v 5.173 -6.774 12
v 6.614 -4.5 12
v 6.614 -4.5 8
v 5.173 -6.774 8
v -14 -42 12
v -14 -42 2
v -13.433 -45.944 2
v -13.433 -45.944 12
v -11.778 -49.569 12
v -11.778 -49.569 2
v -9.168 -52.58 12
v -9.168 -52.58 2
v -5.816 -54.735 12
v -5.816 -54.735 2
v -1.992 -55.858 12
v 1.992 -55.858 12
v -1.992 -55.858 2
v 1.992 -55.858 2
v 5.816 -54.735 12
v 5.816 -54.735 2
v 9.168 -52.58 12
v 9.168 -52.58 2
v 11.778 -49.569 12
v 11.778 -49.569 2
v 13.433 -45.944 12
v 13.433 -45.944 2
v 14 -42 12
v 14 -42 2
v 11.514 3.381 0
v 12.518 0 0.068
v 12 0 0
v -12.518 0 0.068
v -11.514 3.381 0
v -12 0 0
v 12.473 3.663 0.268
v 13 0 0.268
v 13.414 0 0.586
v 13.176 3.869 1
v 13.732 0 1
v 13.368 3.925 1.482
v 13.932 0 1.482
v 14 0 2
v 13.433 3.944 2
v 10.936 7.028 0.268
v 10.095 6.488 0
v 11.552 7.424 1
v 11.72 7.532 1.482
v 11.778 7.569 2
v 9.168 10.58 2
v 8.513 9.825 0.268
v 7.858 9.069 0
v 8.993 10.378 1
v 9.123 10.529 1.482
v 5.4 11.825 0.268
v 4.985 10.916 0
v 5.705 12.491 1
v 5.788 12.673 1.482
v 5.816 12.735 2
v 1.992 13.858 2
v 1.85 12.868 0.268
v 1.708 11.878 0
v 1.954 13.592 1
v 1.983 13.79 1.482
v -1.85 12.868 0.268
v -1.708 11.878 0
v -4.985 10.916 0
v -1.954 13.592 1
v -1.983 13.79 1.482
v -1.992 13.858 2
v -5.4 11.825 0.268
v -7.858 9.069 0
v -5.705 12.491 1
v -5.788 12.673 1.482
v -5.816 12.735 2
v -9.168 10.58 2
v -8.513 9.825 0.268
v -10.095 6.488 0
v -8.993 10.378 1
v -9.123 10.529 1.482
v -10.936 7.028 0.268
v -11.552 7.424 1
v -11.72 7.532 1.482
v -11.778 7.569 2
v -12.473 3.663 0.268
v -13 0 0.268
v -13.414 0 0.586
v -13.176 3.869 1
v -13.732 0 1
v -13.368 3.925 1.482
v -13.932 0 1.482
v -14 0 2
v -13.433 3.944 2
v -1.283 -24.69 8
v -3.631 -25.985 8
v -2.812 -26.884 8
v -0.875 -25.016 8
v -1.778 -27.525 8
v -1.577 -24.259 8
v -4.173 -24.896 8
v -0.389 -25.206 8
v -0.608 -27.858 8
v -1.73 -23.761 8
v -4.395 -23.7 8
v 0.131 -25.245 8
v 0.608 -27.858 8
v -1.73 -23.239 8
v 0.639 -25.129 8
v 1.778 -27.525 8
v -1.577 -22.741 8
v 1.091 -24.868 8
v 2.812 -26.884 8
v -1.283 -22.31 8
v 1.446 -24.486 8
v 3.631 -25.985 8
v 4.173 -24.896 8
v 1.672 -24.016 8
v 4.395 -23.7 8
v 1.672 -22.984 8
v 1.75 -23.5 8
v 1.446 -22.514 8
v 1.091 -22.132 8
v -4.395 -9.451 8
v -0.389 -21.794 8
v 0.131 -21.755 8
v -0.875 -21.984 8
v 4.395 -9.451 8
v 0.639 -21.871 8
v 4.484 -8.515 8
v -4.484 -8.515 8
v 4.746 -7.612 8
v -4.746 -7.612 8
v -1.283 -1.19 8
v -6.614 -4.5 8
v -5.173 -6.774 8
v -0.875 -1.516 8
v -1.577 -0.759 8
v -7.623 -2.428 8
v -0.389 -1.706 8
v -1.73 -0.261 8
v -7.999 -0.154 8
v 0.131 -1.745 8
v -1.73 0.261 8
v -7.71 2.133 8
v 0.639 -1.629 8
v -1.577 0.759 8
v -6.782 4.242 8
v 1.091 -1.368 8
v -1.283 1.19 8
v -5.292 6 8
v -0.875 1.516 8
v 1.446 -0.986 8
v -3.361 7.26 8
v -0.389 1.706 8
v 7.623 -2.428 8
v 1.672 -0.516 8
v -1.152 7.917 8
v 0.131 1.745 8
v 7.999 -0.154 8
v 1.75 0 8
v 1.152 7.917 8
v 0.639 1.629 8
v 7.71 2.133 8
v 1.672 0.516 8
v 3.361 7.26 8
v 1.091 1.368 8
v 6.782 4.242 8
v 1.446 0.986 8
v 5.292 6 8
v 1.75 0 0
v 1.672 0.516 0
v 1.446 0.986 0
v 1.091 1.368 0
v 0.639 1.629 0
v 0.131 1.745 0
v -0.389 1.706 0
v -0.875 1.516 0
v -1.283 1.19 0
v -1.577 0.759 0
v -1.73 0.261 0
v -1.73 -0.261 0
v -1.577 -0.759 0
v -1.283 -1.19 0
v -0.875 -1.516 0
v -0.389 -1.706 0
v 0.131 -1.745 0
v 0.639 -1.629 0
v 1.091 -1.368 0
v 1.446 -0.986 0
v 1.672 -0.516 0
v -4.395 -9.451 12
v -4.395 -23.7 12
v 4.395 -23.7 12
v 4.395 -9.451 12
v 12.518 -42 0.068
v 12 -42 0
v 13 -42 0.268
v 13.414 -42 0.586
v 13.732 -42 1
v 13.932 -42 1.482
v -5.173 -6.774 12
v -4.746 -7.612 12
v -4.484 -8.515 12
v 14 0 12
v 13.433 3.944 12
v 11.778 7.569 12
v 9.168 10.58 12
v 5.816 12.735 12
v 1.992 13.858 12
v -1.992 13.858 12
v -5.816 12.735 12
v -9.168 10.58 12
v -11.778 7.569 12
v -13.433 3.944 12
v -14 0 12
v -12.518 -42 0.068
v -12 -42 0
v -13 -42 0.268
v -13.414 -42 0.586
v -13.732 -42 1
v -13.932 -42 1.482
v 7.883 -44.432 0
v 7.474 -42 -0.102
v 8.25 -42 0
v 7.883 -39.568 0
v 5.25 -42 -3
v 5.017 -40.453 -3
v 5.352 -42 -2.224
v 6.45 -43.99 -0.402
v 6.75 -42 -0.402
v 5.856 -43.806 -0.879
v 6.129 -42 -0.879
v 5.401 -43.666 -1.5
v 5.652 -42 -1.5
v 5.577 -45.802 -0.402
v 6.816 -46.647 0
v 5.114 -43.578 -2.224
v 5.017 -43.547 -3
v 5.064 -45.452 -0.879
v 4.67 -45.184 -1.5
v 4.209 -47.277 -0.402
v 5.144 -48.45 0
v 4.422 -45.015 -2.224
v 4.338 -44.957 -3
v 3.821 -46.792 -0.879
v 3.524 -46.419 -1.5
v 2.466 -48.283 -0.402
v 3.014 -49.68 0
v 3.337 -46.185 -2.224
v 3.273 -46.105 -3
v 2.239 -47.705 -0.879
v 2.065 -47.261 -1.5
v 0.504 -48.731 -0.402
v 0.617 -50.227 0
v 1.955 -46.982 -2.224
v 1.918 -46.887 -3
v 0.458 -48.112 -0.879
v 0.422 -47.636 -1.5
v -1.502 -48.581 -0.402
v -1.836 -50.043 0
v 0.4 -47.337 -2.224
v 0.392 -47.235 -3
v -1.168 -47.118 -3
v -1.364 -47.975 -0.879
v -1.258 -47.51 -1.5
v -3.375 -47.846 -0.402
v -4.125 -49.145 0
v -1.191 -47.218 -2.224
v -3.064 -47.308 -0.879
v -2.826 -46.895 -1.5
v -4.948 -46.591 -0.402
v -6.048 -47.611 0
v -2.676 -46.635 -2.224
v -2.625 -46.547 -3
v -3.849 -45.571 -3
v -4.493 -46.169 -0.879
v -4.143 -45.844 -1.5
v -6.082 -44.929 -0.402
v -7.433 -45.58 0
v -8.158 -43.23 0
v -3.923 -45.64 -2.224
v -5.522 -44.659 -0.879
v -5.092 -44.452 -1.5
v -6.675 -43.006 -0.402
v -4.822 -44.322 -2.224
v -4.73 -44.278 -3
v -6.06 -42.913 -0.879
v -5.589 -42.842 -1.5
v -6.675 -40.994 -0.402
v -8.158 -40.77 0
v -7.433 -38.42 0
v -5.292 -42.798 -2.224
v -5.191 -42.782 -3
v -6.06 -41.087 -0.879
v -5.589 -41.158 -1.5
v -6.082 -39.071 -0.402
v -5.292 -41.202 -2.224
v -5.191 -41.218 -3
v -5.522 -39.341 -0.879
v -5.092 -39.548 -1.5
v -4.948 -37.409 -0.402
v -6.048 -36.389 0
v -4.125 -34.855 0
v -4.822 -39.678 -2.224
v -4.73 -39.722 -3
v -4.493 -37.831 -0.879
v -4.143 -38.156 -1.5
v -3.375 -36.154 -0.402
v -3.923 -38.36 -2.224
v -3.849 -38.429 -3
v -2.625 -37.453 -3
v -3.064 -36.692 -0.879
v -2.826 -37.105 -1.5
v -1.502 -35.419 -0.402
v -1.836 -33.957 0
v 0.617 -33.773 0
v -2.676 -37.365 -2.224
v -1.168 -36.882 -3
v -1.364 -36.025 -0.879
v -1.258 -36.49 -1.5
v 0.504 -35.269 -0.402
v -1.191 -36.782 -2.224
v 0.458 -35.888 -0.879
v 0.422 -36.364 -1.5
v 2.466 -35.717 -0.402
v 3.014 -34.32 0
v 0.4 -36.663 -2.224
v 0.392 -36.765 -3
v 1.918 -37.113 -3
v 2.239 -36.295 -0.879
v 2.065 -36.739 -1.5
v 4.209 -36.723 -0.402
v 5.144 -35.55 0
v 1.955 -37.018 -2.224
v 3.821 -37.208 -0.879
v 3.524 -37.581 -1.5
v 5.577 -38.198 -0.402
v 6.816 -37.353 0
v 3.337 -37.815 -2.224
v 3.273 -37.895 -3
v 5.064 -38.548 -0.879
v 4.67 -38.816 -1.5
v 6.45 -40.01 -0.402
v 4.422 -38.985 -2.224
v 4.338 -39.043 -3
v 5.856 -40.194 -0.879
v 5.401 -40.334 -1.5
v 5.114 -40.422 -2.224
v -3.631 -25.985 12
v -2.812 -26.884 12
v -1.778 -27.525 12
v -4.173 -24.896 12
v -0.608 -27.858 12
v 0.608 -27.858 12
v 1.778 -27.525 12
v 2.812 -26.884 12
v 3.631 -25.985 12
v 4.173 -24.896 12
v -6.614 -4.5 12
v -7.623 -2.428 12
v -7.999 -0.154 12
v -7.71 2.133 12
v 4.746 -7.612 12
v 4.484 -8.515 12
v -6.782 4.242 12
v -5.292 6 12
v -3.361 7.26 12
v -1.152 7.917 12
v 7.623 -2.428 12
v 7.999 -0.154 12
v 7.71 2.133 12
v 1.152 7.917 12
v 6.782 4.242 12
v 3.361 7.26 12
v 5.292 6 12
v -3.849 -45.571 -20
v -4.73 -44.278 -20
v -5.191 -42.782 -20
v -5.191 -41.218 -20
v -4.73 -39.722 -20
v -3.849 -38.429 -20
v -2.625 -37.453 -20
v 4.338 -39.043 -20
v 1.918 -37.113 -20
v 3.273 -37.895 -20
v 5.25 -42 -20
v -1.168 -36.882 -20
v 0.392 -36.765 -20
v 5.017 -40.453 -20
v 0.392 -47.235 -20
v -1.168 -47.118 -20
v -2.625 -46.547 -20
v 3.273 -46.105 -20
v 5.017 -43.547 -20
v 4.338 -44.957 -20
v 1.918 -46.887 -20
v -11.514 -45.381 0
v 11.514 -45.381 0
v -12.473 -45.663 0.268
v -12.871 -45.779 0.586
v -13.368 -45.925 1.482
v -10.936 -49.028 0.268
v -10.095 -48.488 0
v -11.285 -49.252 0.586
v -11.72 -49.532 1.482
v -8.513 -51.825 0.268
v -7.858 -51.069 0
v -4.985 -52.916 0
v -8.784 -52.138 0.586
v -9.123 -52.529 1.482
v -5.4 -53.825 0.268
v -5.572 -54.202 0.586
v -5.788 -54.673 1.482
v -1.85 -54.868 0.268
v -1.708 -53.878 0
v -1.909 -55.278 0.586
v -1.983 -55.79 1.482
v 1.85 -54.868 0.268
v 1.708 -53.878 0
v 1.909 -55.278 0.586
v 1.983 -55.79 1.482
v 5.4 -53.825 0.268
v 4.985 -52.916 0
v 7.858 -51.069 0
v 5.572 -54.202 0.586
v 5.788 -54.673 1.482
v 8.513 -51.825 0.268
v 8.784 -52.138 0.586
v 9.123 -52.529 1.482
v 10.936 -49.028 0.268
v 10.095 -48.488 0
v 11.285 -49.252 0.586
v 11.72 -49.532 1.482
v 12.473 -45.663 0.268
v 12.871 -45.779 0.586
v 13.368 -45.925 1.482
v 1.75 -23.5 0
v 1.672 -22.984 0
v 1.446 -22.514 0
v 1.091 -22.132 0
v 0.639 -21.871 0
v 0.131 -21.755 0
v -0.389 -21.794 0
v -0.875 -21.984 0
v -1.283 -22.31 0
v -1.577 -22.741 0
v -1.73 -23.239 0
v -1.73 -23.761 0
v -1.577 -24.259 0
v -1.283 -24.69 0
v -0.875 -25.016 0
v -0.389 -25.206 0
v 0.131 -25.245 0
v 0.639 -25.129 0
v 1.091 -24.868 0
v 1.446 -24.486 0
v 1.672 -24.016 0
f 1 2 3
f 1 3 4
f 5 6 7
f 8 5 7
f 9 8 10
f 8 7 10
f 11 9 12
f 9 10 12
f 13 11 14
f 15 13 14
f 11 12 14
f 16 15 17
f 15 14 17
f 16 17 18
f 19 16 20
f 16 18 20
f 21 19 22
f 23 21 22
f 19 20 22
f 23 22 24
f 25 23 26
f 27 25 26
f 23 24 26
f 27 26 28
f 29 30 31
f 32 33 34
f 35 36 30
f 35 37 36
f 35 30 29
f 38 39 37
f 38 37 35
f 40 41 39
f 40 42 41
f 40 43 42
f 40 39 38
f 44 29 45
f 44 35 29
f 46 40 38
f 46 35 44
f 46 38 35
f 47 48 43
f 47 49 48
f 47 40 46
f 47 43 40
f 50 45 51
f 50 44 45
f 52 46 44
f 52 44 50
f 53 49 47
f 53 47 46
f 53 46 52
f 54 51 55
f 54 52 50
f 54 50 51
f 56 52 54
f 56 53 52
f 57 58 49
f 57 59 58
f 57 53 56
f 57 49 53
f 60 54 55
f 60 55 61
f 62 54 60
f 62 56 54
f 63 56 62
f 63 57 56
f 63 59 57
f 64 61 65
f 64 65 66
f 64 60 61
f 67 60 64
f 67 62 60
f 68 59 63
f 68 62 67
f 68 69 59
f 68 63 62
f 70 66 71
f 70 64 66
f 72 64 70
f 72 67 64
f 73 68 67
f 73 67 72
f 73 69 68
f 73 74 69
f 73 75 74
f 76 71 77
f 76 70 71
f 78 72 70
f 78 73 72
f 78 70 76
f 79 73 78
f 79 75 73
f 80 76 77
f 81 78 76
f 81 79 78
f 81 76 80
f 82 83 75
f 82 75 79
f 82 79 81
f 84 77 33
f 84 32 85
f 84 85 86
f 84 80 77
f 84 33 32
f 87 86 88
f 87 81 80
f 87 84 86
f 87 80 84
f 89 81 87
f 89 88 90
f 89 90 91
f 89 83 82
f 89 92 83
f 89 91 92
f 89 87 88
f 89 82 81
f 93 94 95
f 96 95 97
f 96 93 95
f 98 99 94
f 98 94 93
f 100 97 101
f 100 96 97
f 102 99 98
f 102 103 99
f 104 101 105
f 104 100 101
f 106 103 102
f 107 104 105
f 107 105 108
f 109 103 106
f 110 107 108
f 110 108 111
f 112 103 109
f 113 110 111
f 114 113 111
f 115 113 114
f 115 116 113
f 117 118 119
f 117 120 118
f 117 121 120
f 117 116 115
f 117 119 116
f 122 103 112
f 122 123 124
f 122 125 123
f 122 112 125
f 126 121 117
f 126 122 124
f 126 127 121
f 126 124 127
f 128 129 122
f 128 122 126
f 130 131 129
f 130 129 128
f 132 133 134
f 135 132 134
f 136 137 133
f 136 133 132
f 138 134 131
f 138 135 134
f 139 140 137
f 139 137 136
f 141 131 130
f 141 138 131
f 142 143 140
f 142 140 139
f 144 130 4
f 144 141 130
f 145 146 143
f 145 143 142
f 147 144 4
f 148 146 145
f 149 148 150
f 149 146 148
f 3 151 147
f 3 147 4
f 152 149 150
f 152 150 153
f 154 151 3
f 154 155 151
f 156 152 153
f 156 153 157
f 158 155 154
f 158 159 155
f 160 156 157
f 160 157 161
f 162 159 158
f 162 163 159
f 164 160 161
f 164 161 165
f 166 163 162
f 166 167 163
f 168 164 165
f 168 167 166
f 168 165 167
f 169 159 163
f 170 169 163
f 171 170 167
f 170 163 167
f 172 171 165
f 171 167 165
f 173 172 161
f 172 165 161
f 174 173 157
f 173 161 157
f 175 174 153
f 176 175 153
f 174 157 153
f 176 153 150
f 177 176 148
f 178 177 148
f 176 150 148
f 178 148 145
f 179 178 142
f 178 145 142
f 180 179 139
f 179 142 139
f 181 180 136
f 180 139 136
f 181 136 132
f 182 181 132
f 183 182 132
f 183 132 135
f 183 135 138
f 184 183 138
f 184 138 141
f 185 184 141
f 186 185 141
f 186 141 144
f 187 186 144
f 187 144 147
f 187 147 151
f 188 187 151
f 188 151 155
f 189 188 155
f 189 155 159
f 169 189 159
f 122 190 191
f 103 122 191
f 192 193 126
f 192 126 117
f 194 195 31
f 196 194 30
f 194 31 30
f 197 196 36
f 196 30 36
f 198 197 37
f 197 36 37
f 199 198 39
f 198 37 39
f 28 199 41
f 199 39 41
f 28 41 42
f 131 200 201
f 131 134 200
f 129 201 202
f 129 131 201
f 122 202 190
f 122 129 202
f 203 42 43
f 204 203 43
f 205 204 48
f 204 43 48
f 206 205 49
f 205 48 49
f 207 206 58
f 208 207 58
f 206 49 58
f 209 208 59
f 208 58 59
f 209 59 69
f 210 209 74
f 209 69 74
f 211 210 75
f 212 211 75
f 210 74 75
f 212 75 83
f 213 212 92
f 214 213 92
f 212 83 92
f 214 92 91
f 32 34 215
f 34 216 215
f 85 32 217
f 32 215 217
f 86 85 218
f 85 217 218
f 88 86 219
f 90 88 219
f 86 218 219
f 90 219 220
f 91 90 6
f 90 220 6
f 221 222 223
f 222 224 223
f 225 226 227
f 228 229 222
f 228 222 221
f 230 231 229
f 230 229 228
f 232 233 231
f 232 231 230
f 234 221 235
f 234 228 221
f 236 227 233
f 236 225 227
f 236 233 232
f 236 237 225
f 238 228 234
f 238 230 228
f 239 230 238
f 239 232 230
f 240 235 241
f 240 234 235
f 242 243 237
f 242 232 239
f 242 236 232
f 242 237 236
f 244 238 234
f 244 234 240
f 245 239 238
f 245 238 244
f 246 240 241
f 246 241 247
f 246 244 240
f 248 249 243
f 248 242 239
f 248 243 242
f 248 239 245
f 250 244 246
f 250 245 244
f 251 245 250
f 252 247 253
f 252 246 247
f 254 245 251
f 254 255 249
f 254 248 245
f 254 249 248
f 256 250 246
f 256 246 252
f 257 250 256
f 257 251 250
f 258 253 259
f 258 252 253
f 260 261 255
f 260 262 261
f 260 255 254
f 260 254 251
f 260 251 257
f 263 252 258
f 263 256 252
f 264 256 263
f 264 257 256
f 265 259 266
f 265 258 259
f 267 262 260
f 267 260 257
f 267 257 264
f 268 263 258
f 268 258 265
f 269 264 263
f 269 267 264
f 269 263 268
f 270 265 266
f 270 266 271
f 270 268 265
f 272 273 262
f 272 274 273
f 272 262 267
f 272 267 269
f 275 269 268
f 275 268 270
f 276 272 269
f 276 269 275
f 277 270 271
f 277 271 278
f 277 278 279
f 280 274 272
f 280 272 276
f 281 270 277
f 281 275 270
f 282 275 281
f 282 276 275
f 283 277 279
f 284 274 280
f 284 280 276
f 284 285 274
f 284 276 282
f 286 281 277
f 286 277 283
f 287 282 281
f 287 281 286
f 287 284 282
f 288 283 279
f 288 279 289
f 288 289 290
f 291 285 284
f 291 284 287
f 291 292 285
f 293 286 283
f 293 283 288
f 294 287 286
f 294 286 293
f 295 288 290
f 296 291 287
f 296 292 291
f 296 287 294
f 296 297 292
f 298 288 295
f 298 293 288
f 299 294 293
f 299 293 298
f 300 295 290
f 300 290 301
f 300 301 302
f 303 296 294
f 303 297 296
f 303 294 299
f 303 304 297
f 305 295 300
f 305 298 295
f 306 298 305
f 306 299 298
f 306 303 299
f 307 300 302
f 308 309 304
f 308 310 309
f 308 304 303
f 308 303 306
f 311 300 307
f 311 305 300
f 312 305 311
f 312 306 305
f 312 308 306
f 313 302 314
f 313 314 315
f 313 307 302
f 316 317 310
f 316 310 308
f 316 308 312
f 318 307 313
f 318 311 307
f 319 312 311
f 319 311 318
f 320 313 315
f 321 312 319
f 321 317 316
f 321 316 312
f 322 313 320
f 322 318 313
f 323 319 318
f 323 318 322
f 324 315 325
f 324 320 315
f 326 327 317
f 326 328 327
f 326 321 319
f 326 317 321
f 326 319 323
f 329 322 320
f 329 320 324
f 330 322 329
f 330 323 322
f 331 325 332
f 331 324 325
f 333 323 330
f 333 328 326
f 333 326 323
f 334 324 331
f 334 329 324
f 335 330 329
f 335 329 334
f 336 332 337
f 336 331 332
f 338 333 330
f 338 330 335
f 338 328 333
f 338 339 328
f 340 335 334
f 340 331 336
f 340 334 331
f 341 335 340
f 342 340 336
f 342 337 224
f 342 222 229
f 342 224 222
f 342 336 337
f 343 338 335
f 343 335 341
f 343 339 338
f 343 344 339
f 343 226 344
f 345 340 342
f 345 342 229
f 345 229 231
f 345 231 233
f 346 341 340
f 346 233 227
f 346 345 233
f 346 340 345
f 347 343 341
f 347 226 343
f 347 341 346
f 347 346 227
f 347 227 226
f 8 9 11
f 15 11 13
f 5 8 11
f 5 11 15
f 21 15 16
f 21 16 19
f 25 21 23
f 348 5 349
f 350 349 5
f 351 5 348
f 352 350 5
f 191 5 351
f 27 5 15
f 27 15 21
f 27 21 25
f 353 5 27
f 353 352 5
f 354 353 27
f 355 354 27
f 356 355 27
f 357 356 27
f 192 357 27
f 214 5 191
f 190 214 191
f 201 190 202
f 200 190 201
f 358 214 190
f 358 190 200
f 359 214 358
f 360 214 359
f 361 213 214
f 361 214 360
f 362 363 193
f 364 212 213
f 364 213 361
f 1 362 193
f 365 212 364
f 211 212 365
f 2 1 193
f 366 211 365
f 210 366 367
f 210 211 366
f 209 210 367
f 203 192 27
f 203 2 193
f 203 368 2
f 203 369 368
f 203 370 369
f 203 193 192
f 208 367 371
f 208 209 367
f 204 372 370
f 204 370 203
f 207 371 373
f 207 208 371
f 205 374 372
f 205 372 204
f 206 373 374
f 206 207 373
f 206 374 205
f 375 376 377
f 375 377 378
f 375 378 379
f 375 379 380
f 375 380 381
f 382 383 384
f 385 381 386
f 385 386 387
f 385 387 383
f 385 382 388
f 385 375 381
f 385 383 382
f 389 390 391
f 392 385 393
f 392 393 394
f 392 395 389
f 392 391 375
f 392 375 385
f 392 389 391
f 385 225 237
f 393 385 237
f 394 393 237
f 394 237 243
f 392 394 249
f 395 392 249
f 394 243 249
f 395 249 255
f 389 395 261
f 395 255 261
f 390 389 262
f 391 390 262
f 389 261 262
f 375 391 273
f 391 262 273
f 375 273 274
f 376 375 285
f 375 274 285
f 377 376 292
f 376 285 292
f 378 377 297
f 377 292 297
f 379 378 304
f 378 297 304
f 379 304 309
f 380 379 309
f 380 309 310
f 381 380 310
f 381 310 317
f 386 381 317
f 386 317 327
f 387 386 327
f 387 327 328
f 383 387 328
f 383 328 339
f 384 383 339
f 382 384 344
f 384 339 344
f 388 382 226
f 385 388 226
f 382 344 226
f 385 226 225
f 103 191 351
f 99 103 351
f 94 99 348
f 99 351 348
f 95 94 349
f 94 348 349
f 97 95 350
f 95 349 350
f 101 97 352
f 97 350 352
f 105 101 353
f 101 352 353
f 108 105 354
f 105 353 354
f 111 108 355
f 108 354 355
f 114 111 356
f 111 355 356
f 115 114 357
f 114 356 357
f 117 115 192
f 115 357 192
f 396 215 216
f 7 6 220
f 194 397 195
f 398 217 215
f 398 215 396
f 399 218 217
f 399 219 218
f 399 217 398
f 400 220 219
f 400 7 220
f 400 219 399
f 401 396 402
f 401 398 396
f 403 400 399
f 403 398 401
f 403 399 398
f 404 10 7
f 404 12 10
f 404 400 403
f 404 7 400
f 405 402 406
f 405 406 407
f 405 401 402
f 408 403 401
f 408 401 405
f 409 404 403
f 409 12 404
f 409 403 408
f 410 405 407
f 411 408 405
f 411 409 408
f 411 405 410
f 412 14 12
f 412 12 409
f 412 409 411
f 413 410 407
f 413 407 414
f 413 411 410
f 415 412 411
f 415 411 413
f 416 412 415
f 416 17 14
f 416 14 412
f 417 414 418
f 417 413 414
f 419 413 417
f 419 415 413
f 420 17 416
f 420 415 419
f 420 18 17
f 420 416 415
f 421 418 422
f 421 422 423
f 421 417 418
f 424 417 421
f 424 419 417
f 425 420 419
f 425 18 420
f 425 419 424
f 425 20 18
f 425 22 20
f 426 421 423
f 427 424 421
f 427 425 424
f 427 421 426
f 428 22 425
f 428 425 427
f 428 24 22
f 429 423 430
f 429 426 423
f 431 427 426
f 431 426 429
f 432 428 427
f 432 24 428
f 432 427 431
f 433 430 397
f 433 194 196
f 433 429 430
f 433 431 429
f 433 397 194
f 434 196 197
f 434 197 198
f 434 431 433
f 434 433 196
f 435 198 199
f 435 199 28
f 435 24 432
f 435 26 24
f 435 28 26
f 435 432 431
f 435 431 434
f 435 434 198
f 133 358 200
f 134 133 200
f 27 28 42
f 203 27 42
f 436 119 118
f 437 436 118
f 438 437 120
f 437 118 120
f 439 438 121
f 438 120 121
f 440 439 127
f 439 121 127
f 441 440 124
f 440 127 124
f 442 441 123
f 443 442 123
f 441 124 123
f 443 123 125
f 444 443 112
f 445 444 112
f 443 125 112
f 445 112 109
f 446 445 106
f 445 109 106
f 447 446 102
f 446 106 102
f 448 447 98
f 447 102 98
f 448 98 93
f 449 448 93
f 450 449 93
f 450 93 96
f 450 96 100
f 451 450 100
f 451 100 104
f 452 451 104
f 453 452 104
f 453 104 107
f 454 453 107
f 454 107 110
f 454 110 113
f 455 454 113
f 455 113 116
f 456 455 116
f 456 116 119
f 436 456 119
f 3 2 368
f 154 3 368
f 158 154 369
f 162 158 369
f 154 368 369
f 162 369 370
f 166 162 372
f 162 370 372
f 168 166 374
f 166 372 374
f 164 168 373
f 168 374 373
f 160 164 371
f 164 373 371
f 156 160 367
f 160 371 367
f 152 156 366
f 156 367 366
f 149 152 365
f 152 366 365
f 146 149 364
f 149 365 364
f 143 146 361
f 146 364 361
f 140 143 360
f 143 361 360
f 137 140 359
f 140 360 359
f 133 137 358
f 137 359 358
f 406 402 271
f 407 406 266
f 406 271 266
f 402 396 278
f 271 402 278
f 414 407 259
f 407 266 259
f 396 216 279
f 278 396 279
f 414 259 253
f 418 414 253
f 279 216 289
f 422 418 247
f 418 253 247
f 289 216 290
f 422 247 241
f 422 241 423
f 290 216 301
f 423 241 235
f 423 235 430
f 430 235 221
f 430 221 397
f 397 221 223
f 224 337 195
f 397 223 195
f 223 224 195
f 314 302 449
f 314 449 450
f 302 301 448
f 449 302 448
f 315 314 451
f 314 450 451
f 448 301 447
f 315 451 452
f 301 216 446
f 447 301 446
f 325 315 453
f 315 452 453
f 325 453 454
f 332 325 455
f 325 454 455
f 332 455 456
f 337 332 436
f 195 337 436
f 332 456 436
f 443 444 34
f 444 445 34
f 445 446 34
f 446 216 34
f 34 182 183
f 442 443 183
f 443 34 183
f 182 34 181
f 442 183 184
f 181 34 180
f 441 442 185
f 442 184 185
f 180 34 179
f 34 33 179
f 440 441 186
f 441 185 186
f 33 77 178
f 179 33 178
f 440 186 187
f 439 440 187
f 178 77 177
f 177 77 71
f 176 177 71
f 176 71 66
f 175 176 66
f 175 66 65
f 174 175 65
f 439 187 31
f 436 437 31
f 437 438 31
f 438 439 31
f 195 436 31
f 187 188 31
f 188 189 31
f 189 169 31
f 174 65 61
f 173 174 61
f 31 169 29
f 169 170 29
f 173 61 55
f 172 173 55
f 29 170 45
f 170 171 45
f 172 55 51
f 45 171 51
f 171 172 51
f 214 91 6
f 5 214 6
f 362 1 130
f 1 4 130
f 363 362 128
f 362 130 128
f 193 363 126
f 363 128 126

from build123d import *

# Parameters (mm, degrees)
PAD_DEPTH       = 12
POCKET_DEPTH    = 4
SKETCH002_R     = 5.25
PAD001_DEPTH    = 20
SKETCH003_R     = 1.75
POCKET001_DEPTH = 28.001
FILLET_R        = 3
FILLET001_R     = 2
FILLET002_R     = 5


with BuildPart() as part:
    # Sketch001 → Pad (new body)
    with BuildSketch(Plane.XY):
        with BuildLine():
            ThreePointArc((14, 0), (0, 14), (-14, 0))
            Line((-14, 0), (-14, -42))
            ThreePointArc((-14, -42), (0, -56), (14, -42))
            Line((14, -42), (14, 0))
        make_face()
    extrude(amount=PAD_DEPTH)

    # Sketch (on Face6 of Pad) → Pocket (cut)
    with BuildSketch(Plane.XY.offset(12)):
        with BuildLine():
            ThreePointArc((6.614378, -4.5), (0, 8), (-6.614378, -4.5))
            Line((-6.614378, -4.5), (-4.395452, -8))
            Line((-4.395452, -8), (-4.395452, -23.7))
            ThreePointArc((-4.395452, -23.7), (0, -27.9), (4.395452, -23.7))
            Line((4.395452, -8), (4.395452, -23.7))
            Line((6.614378, -4.5), (4.395452, -8))
        make_face()
    extrude(amount=-POCKET_DEPTH, mode=Mode.SUBTRACT)

    # Sketch002 (on Face4 of Pocket) → Pad001 (join)
    with BuildSketch(Plane(origin=(0, 0, 0), x_dir=(1, 0, 0), z_dir=(0, 0, -1))):
        with Locations((0, 42)):
            Circle(SKETCH002_R)
    extrude(amount=PAD001_DEPTH)

    # Sketch003 (on Face15 of Pad001) → Pocket001 (cut, through all)
    with BuildSketch(Plane.XY.offset(8)):
        Circle(SKETCH003_R)
        with Locations((0, -23.5)):
            Circle(SKETCH003_R)
    extrude(amount=-POCKET001_DEPTH, mode=Mode.SUBTRACT)

    # Fillet
    fillet_edges = [part.edges().sort_by_distance(p)[0] for p in [
        (-5.25, -42, 0),
    ]]
    fillet(fillet_edges, radius=FILLET_R)

    # Fillet001
    fillet001_edges = [part.edges().sort_by_distance(p)[0] for p in [
        (-14, -21, 0),
        (0, 14, 0),
        (14, -21, 0),
        (0, -56, 0),
    ]]
    fillet(fillet001_edges, radius=FILLET001_R)

    # Fillet002
    fillet002_edges = [part.edges().sort_by_distance(p)[0] for p in [
        (-4.395452, -8, 10),
        (4.395452, -8, 10),
    ]]
    fillet(fillet002_edges, radius=FILLET002_R)


solid = part.part
